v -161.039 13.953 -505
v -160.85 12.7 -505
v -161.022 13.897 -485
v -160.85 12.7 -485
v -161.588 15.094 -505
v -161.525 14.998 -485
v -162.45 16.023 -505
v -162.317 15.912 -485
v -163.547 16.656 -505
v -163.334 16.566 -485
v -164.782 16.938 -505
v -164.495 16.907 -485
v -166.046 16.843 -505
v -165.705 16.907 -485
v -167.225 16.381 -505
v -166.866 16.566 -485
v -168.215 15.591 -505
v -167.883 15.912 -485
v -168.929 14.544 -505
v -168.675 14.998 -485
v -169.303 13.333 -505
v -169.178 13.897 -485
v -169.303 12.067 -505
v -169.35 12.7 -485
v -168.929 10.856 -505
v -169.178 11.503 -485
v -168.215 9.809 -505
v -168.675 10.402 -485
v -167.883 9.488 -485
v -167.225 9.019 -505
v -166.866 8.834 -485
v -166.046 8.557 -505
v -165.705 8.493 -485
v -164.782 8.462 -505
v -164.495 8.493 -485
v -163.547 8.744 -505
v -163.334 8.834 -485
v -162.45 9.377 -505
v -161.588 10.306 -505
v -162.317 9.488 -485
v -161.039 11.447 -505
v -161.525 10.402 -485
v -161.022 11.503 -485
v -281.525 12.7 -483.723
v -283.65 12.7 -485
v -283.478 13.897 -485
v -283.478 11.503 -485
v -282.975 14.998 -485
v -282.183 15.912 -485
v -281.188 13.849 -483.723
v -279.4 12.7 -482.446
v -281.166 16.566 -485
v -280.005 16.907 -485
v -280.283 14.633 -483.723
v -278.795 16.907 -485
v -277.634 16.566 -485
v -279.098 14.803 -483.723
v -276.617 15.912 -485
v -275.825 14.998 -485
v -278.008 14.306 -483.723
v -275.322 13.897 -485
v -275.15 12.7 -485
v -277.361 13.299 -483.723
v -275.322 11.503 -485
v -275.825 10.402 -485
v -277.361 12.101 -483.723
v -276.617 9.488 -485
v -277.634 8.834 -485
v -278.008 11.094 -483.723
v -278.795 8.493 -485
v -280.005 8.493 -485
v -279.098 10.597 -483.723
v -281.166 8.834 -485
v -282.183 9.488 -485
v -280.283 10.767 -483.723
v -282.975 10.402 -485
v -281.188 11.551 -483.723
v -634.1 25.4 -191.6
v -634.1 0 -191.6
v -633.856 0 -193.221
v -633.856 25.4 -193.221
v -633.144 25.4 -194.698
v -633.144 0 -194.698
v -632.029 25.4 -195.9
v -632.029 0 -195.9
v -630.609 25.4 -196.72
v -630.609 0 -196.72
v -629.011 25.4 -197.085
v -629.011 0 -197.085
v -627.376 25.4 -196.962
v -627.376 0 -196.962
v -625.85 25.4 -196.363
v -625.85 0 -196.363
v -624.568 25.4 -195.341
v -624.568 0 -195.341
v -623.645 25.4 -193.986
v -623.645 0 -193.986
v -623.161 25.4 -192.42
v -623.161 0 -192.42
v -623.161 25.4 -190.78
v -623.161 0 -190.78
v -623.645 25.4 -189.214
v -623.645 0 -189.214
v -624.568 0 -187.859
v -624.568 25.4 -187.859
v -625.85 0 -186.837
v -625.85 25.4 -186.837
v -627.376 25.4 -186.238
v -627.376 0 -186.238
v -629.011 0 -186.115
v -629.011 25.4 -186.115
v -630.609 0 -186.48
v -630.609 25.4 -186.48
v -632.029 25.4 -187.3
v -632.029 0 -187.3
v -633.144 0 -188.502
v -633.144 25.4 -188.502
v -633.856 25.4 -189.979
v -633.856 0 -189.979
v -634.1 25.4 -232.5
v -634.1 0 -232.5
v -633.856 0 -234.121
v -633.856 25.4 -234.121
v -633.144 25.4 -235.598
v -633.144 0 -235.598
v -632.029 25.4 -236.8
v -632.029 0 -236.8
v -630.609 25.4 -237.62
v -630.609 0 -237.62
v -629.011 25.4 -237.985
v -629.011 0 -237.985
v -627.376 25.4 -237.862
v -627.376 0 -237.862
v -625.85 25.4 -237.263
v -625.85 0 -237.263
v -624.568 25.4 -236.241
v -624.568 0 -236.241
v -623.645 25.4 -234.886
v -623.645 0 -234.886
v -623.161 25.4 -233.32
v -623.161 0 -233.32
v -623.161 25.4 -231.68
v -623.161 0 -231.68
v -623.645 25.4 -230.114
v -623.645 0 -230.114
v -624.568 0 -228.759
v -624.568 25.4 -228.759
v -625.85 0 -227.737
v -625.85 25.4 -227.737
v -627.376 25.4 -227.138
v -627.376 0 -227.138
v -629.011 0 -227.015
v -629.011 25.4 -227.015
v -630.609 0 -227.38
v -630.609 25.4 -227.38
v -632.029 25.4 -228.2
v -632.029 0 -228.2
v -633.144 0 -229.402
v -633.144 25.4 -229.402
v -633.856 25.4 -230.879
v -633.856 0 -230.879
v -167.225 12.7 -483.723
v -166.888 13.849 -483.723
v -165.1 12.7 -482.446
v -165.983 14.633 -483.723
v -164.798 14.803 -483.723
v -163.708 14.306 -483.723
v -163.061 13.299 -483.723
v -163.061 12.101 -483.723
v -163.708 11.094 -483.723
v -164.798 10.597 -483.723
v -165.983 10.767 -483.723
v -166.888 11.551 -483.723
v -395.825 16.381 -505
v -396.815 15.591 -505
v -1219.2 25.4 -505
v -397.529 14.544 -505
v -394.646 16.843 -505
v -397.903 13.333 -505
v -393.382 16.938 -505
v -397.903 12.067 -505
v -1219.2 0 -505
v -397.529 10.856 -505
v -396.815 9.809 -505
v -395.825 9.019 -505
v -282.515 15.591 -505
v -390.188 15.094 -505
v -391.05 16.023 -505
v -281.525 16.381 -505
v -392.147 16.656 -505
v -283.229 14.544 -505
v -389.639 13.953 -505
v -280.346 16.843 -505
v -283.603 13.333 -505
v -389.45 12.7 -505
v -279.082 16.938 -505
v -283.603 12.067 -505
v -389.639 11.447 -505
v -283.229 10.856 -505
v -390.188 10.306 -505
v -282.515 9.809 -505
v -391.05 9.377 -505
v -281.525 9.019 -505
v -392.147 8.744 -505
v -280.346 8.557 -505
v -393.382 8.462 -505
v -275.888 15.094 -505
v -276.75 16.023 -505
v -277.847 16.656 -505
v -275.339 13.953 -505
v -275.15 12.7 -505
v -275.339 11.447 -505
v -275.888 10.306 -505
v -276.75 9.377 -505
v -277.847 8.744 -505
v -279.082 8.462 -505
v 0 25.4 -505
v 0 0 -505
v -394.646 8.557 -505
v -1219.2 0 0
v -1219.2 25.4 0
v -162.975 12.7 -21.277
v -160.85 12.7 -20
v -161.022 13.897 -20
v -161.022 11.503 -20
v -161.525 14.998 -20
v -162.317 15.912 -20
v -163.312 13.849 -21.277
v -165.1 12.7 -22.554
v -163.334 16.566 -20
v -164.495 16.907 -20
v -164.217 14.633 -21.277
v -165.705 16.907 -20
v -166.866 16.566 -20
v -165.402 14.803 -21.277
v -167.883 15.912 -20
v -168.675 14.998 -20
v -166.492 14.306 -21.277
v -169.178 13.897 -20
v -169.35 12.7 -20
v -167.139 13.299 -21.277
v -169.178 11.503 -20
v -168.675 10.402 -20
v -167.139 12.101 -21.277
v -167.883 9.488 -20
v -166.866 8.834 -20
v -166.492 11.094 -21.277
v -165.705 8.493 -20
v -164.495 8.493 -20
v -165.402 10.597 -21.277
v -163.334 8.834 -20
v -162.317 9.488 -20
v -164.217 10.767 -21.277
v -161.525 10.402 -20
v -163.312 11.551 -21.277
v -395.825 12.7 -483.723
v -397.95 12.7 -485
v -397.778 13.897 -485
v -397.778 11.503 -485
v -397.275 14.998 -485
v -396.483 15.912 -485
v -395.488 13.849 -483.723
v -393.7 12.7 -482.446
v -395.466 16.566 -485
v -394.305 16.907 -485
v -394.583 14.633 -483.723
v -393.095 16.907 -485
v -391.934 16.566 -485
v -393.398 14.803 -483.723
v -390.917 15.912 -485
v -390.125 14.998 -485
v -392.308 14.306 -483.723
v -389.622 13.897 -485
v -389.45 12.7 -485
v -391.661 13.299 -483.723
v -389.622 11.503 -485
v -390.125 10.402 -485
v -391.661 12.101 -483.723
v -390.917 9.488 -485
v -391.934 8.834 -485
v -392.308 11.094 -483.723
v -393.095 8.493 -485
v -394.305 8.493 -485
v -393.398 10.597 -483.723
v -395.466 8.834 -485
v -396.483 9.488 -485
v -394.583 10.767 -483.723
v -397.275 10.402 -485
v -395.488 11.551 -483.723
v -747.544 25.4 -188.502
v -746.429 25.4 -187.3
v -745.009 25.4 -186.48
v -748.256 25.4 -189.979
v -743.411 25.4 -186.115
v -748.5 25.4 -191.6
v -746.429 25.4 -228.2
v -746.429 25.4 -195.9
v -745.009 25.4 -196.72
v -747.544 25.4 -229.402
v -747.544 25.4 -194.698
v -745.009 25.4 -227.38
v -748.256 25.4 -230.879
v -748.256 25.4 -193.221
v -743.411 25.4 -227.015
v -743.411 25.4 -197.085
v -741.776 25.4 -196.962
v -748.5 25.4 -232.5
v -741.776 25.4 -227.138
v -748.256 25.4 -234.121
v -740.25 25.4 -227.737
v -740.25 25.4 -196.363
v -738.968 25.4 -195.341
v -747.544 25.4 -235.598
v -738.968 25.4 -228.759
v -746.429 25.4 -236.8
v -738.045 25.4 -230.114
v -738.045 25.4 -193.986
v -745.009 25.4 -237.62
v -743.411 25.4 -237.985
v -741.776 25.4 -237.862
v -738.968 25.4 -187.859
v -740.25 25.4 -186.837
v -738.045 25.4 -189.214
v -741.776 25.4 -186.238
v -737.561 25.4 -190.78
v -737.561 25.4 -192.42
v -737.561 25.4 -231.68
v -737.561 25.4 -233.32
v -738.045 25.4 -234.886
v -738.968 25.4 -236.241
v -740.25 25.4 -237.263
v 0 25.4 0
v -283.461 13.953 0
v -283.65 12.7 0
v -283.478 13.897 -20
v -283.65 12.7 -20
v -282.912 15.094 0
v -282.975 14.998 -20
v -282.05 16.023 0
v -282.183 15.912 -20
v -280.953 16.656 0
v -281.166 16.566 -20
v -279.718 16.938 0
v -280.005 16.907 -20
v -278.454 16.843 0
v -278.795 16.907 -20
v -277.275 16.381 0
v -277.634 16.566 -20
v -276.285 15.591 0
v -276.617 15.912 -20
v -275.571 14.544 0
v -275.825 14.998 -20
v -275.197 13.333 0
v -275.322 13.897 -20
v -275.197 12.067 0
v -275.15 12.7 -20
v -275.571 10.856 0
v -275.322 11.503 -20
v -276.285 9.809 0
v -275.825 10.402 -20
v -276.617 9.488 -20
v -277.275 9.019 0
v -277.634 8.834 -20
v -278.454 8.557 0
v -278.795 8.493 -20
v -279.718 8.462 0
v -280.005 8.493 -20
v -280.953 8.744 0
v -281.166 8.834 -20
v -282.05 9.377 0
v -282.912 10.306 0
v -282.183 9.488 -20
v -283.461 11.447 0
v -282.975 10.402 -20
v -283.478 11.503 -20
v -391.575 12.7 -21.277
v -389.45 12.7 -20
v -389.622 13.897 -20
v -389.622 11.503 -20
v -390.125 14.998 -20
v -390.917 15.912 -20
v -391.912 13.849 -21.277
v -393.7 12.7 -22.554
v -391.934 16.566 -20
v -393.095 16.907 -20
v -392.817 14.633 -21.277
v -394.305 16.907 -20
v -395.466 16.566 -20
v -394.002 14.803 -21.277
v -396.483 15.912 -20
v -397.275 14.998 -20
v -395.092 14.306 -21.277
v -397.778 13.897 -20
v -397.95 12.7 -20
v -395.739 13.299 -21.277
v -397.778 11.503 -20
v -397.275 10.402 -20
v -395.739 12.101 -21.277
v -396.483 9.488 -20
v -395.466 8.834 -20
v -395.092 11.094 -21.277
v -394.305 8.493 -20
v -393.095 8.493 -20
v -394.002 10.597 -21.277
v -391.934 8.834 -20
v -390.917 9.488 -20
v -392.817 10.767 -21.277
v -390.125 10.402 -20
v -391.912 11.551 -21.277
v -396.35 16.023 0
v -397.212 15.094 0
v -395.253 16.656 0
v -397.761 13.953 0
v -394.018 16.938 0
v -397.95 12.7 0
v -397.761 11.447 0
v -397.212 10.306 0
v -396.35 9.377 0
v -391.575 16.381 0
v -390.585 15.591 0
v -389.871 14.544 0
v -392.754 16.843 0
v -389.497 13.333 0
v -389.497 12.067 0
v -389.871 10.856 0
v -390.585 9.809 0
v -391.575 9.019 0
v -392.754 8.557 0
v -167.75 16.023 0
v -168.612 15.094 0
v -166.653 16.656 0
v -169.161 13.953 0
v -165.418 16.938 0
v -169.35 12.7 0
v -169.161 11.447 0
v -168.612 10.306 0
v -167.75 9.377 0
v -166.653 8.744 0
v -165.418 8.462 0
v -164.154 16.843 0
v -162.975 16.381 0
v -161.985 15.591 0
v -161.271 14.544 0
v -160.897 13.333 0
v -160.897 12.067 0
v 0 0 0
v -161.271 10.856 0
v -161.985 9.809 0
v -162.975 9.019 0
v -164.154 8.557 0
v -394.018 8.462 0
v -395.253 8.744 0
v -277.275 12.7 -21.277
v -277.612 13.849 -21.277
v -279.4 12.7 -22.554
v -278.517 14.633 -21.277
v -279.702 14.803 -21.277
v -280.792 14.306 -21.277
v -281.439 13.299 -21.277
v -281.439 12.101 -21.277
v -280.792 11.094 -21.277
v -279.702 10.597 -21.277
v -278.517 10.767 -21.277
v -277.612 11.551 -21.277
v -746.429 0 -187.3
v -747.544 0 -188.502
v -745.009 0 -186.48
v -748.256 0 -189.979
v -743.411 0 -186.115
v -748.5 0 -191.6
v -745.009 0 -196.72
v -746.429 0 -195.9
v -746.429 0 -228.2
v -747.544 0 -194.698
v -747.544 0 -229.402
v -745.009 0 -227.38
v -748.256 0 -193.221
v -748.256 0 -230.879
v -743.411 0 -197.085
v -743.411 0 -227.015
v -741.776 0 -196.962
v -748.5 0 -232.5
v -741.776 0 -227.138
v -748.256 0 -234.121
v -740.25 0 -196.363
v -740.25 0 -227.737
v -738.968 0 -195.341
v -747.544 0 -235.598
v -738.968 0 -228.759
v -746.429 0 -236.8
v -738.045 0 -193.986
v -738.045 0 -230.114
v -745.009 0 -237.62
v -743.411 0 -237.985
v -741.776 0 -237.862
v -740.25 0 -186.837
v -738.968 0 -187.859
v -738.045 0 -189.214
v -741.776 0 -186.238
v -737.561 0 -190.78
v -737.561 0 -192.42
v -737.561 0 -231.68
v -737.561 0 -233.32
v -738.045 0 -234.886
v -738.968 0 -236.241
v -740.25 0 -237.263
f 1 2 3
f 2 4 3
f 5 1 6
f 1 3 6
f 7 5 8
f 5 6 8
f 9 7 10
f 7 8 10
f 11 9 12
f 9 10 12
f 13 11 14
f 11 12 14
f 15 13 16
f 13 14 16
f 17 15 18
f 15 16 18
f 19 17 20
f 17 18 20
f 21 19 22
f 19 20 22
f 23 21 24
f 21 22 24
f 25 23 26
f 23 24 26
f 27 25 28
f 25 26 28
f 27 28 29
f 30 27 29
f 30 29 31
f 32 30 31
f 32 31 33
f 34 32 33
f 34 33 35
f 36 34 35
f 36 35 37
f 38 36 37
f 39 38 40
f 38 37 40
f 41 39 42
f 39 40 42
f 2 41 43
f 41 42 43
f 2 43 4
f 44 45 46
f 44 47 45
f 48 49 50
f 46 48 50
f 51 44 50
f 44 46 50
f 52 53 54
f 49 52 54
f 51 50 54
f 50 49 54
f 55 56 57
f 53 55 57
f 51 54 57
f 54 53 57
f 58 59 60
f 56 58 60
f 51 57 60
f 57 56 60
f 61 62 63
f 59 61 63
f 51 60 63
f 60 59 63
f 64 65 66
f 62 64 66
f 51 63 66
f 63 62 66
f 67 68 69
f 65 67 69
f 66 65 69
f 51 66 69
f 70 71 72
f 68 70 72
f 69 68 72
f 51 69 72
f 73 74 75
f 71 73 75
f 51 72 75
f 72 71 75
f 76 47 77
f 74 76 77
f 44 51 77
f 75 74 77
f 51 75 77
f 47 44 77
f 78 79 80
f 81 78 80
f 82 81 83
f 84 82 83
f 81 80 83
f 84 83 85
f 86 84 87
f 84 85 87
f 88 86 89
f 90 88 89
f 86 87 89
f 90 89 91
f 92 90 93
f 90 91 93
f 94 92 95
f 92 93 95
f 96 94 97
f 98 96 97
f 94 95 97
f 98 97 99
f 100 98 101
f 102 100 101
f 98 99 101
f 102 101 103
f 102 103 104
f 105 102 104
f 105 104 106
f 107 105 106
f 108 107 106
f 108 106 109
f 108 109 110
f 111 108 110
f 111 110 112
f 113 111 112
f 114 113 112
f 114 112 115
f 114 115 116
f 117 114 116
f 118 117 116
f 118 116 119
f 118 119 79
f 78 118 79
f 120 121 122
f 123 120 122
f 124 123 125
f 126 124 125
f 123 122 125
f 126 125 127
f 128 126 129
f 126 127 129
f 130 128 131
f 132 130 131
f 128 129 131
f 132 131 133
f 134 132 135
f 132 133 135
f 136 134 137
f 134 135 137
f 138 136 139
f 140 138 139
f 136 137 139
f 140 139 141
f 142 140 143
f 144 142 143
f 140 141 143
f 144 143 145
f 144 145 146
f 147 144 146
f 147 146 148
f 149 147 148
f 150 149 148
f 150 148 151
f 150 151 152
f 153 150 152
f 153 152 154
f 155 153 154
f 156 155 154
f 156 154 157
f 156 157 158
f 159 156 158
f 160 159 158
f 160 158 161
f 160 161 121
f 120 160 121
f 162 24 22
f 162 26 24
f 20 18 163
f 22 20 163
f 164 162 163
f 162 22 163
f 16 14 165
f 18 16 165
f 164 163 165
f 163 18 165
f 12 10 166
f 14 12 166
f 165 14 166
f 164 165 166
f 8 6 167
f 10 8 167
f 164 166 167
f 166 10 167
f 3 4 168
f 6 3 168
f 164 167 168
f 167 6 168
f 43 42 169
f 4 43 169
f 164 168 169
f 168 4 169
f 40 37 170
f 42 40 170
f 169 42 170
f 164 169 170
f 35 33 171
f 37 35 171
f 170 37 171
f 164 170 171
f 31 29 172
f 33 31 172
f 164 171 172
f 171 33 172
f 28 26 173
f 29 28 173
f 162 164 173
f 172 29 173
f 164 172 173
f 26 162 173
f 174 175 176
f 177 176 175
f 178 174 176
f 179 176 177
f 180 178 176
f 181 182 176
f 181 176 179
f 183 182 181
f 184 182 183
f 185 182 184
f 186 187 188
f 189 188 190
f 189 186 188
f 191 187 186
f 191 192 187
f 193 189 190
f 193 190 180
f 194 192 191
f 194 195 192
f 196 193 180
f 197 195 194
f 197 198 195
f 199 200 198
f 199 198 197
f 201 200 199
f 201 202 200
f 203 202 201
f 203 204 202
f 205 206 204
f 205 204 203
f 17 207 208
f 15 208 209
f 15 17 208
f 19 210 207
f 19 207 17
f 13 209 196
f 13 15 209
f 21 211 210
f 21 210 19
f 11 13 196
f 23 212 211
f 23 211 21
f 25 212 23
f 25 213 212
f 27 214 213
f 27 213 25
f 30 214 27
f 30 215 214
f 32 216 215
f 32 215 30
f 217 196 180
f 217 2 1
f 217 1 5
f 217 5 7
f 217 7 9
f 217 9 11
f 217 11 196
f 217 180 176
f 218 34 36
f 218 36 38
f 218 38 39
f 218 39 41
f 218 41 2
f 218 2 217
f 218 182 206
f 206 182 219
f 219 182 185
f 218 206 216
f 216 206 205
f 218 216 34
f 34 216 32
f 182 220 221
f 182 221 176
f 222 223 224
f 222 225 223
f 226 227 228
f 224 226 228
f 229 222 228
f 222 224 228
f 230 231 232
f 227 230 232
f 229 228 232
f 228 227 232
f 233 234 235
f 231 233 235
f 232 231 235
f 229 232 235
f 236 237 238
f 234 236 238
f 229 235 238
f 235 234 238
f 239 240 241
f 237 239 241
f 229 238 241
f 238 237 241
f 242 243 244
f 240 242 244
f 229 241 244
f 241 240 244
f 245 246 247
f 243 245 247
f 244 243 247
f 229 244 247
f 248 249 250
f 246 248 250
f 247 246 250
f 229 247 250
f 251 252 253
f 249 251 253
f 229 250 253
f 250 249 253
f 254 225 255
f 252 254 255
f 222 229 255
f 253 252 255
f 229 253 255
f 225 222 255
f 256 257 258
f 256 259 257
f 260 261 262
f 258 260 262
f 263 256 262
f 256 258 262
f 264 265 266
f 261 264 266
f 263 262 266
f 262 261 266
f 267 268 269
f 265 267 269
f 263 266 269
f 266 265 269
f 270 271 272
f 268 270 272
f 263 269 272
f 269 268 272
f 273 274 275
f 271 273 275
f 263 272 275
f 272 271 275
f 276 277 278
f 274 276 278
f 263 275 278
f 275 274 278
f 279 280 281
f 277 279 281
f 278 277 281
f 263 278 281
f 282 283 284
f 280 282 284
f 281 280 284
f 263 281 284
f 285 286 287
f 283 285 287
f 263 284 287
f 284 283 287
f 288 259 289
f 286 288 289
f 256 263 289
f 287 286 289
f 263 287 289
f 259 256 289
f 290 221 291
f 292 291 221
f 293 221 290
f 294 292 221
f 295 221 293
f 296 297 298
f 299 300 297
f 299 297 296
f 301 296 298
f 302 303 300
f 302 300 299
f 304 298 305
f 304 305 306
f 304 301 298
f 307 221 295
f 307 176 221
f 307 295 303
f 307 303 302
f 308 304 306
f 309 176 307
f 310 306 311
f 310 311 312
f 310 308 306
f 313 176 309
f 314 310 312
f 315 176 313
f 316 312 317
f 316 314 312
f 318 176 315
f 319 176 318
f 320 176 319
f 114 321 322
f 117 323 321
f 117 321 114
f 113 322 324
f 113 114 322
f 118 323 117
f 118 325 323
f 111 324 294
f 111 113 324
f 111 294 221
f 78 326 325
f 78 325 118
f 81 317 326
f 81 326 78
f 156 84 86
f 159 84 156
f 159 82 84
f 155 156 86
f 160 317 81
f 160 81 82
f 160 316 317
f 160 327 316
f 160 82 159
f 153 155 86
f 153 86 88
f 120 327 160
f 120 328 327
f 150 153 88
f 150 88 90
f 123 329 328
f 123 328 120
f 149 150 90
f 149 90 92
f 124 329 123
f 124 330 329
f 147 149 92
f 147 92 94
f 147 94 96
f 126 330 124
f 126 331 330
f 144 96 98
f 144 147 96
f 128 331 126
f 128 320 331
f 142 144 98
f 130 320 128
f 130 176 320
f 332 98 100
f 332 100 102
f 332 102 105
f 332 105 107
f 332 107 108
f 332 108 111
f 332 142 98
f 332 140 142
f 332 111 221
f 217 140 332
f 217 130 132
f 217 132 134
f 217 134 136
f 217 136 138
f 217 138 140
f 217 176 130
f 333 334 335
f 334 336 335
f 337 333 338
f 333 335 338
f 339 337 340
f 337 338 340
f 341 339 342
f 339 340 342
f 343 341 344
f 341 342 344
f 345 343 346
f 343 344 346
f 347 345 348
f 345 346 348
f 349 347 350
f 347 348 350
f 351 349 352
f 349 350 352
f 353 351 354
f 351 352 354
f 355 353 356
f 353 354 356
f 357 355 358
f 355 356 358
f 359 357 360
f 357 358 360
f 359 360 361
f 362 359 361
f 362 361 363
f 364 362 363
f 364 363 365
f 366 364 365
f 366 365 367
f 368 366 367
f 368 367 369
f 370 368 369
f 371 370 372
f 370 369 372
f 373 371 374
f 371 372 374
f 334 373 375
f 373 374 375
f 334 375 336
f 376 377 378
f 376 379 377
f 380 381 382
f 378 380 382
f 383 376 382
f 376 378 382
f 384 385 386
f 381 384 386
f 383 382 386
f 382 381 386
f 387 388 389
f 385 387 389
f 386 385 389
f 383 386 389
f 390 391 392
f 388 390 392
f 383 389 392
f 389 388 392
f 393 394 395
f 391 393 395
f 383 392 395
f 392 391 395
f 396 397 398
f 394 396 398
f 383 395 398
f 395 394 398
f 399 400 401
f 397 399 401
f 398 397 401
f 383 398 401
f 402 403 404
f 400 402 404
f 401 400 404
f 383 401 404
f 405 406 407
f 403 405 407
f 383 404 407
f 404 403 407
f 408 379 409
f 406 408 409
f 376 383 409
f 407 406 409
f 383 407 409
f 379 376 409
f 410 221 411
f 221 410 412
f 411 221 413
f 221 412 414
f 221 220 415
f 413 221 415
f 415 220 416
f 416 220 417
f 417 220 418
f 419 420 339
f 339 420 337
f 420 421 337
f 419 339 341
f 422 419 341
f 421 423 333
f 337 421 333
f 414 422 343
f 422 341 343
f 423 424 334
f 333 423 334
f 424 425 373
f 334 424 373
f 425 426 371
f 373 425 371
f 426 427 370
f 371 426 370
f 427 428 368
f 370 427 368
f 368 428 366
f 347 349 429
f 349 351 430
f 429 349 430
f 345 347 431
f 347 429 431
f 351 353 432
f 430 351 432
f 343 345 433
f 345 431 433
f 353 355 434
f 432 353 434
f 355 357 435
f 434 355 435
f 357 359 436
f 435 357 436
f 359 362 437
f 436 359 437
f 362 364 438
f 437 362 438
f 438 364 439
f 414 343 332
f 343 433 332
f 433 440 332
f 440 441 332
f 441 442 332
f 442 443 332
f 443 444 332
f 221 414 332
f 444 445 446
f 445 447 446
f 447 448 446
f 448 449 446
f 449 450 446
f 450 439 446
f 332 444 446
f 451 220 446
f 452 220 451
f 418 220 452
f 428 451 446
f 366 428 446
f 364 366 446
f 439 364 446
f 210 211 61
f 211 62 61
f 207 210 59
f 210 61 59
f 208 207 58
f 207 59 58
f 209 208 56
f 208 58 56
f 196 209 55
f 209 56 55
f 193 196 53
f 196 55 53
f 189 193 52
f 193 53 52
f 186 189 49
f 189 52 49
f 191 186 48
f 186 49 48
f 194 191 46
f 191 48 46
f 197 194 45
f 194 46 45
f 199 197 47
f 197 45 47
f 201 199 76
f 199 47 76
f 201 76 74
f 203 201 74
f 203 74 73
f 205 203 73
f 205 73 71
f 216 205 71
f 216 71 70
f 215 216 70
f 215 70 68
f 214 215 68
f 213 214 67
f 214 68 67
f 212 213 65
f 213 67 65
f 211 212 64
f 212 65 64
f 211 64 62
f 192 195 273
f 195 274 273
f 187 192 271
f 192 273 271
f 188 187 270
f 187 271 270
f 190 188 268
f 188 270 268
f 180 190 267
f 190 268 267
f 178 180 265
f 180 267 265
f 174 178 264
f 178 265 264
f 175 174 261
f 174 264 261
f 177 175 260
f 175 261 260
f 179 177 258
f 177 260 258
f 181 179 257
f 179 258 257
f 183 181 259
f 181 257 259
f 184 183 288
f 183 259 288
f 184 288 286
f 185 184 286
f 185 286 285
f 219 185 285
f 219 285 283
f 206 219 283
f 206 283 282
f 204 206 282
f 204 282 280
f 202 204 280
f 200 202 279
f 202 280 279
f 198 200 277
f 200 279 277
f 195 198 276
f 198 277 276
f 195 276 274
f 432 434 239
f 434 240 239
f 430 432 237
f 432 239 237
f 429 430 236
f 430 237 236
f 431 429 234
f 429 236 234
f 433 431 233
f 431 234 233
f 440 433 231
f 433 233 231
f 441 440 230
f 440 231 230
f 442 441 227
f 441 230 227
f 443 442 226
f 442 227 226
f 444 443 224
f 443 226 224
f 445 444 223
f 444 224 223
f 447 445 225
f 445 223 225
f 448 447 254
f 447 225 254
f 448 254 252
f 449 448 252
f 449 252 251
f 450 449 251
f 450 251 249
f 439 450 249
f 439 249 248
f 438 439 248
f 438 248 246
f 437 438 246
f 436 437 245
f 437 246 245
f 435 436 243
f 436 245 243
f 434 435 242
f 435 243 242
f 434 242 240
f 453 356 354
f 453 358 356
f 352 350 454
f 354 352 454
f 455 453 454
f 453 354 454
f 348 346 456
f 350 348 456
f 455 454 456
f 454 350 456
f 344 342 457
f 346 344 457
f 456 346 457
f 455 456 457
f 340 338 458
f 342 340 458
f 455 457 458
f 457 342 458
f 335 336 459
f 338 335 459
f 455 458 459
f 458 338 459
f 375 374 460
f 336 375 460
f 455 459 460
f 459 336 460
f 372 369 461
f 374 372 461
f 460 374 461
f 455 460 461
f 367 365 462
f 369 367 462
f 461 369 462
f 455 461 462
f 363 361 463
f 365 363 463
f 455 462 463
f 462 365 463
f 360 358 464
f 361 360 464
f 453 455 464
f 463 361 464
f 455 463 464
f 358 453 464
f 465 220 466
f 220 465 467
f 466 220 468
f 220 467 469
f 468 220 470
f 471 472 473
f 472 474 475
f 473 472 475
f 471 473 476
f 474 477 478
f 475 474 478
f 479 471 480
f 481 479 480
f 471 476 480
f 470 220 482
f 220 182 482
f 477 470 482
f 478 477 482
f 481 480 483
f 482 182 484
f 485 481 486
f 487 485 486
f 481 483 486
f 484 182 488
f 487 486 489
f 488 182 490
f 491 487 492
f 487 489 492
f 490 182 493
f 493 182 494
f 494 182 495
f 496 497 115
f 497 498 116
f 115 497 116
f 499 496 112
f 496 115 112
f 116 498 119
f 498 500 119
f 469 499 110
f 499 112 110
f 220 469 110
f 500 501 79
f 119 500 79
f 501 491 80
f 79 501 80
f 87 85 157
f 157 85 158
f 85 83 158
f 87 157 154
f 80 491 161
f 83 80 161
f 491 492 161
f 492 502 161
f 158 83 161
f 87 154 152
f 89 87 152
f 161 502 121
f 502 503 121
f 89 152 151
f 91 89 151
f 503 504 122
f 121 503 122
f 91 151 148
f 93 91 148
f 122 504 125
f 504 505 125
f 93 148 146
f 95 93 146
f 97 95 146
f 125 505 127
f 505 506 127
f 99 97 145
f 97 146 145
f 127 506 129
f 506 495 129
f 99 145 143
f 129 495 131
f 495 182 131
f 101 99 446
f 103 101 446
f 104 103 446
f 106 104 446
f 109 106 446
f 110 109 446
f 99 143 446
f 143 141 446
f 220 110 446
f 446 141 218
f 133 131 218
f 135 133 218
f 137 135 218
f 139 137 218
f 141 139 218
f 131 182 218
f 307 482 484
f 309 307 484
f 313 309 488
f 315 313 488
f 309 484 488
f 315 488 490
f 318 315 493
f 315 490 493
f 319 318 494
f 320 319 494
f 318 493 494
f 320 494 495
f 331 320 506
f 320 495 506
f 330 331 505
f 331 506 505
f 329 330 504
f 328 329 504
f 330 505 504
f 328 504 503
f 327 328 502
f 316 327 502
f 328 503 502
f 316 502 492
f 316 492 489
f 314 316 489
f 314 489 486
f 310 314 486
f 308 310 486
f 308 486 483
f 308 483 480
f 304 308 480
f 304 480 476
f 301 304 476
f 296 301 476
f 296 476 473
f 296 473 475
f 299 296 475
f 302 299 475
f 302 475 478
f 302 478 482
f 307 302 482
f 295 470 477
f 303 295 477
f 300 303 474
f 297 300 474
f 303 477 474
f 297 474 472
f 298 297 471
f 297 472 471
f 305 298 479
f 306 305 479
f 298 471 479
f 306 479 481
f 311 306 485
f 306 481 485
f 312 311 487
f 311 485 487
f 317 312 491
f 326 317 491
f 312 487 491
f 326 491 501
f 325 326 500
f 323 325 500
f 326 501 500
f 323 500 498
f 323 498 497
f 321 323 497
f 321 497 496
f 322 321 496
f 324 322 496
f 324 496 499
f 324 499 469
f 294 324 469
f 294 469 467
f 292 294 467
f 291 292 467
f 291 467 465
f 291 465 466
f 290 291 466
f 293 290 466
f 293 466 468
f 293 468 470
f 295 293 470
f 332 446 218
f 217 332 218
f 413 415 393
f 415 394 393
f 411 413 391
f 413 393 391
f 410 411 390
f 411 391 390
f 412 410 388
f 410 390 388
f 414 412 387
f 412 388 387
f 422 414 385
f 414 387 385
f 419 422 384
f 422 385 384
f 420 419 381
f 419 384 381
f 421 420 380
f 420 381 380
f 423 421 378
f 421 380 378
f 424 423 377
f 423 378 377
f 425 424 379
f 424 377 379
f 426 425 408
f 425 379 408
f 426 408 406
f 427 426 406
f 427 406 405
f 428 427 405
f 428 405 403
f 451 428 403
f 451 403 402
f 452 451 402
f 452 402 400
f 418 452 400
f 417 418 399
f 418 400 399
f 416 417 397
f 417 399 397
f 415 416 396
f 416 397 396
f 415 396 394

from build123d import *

# Parameters (mm, degrees)
SKETCH1_W                        = 1219.2
SKETCH1_H                        = 505
BOSS_EXTRUDE1_DEPTH              = 25.4
TAP_DRILL_FOR_M10X1_5_TAP1_D     = 8.5
TAP_DRILL_FOR_M10X1_5_TAP1_DEPTH = 20
TAP_DRILL_FOR_M10X1_5_TAP1_TIP   = 2.553657631
TAP_DRILL_FOR_M10X1_5_TAP2_D     = 8.5
TAP_DRILL_FOR_M10X1_5_TAP2_DEPTH = 20
TAP_DRILL_FOR_M10X1_5_TAP2_TIP   = 2.553657631
M10_CLEARANCE_HOLE1_D            = 11


with BuildPart() as part:
    # Sketch1 → Boss-Extrude1 (new body)
    with BuildSketch(Plane(origin=(0, 0, 0), x_dir=(1, 0, 0), z_dir=(0, 1, 0))):
        with Locations((-609.6, 252.5)):
            Rectangle(SKETCH1_W, SKETCH1_H)
    extrude(amount=BOSS_EXTRUDE1_DEPTH)

    # Tap Drill for M10x1.5 Tap1
    with Locations(Plane.XY):
        with Locations((-393.7, 12.7), (-279.4, 12.7), (-165.1, 12.7)):
            Hole(TAP_DRILL_FOR_M10X1_5_TAP1_D / 2, depth=TAP_DRILL_FOR_M10X1_5_TAP1_DEPTH)
            with Locations((0, 0, -(TAP_DRILL_FOR_M10X1_5_TAP1_DEPTH + TAP_DRILL_FOR_M10X1_5_TAP1_TIP / 2))):  # 118° drill point
                Cone(0, TAP_DRILL_FOR_M10X1_5_TAP1_D / 2, TAP_DRILL_FOR_M10X1_5_TAP1_TIP, mode=Mode.SUBTRACT)

    # Tap Drill for M10x1.5 Tap2
    with Locations(Plane(origin=(0, 0, -505), x_dir=(-1, 0, 0), z_dir=(0, 0, -1))):
        with Locations((165.1, 12.7), (279.4, 12.7), (393.7, 12.7)):
            Hole(TAP_DRILL_FOR_M10X1_5_TAP2_D / 2, depth=TAP_DRILL_FOR_M10X1_5_TAP2_DEPTH)
            with Locations((0, 0, -(TAP_DRILL_FOR_M10X1_5_TAP2_DEPTH + TAP_DRILL_FOR_M10X1_5_TAP2_TIP / 2))):  # 118° drill point
                Cone(0, TAP_DRILL_FOR_M10X1_5_TAP2_D / 2, TAP_DRILL_FOR_M10X1_5_TAP2_TIP, mode=Mode.SUBTRACT)

    # M10 Clearance Hole1 (through all)
    with Locations(Plane(origin=(0, 25.4, 0), x_dir=(1, 0, 0), z_dir=(0, 1, 0))):
        with Locations((-628.6, 191.6), (-628.6, 232.5), (-743, 232.5), (-743, 191.6)):
            Hole(M10_CLEARANCE_HOLE1_D / 2)


solid = part.part
